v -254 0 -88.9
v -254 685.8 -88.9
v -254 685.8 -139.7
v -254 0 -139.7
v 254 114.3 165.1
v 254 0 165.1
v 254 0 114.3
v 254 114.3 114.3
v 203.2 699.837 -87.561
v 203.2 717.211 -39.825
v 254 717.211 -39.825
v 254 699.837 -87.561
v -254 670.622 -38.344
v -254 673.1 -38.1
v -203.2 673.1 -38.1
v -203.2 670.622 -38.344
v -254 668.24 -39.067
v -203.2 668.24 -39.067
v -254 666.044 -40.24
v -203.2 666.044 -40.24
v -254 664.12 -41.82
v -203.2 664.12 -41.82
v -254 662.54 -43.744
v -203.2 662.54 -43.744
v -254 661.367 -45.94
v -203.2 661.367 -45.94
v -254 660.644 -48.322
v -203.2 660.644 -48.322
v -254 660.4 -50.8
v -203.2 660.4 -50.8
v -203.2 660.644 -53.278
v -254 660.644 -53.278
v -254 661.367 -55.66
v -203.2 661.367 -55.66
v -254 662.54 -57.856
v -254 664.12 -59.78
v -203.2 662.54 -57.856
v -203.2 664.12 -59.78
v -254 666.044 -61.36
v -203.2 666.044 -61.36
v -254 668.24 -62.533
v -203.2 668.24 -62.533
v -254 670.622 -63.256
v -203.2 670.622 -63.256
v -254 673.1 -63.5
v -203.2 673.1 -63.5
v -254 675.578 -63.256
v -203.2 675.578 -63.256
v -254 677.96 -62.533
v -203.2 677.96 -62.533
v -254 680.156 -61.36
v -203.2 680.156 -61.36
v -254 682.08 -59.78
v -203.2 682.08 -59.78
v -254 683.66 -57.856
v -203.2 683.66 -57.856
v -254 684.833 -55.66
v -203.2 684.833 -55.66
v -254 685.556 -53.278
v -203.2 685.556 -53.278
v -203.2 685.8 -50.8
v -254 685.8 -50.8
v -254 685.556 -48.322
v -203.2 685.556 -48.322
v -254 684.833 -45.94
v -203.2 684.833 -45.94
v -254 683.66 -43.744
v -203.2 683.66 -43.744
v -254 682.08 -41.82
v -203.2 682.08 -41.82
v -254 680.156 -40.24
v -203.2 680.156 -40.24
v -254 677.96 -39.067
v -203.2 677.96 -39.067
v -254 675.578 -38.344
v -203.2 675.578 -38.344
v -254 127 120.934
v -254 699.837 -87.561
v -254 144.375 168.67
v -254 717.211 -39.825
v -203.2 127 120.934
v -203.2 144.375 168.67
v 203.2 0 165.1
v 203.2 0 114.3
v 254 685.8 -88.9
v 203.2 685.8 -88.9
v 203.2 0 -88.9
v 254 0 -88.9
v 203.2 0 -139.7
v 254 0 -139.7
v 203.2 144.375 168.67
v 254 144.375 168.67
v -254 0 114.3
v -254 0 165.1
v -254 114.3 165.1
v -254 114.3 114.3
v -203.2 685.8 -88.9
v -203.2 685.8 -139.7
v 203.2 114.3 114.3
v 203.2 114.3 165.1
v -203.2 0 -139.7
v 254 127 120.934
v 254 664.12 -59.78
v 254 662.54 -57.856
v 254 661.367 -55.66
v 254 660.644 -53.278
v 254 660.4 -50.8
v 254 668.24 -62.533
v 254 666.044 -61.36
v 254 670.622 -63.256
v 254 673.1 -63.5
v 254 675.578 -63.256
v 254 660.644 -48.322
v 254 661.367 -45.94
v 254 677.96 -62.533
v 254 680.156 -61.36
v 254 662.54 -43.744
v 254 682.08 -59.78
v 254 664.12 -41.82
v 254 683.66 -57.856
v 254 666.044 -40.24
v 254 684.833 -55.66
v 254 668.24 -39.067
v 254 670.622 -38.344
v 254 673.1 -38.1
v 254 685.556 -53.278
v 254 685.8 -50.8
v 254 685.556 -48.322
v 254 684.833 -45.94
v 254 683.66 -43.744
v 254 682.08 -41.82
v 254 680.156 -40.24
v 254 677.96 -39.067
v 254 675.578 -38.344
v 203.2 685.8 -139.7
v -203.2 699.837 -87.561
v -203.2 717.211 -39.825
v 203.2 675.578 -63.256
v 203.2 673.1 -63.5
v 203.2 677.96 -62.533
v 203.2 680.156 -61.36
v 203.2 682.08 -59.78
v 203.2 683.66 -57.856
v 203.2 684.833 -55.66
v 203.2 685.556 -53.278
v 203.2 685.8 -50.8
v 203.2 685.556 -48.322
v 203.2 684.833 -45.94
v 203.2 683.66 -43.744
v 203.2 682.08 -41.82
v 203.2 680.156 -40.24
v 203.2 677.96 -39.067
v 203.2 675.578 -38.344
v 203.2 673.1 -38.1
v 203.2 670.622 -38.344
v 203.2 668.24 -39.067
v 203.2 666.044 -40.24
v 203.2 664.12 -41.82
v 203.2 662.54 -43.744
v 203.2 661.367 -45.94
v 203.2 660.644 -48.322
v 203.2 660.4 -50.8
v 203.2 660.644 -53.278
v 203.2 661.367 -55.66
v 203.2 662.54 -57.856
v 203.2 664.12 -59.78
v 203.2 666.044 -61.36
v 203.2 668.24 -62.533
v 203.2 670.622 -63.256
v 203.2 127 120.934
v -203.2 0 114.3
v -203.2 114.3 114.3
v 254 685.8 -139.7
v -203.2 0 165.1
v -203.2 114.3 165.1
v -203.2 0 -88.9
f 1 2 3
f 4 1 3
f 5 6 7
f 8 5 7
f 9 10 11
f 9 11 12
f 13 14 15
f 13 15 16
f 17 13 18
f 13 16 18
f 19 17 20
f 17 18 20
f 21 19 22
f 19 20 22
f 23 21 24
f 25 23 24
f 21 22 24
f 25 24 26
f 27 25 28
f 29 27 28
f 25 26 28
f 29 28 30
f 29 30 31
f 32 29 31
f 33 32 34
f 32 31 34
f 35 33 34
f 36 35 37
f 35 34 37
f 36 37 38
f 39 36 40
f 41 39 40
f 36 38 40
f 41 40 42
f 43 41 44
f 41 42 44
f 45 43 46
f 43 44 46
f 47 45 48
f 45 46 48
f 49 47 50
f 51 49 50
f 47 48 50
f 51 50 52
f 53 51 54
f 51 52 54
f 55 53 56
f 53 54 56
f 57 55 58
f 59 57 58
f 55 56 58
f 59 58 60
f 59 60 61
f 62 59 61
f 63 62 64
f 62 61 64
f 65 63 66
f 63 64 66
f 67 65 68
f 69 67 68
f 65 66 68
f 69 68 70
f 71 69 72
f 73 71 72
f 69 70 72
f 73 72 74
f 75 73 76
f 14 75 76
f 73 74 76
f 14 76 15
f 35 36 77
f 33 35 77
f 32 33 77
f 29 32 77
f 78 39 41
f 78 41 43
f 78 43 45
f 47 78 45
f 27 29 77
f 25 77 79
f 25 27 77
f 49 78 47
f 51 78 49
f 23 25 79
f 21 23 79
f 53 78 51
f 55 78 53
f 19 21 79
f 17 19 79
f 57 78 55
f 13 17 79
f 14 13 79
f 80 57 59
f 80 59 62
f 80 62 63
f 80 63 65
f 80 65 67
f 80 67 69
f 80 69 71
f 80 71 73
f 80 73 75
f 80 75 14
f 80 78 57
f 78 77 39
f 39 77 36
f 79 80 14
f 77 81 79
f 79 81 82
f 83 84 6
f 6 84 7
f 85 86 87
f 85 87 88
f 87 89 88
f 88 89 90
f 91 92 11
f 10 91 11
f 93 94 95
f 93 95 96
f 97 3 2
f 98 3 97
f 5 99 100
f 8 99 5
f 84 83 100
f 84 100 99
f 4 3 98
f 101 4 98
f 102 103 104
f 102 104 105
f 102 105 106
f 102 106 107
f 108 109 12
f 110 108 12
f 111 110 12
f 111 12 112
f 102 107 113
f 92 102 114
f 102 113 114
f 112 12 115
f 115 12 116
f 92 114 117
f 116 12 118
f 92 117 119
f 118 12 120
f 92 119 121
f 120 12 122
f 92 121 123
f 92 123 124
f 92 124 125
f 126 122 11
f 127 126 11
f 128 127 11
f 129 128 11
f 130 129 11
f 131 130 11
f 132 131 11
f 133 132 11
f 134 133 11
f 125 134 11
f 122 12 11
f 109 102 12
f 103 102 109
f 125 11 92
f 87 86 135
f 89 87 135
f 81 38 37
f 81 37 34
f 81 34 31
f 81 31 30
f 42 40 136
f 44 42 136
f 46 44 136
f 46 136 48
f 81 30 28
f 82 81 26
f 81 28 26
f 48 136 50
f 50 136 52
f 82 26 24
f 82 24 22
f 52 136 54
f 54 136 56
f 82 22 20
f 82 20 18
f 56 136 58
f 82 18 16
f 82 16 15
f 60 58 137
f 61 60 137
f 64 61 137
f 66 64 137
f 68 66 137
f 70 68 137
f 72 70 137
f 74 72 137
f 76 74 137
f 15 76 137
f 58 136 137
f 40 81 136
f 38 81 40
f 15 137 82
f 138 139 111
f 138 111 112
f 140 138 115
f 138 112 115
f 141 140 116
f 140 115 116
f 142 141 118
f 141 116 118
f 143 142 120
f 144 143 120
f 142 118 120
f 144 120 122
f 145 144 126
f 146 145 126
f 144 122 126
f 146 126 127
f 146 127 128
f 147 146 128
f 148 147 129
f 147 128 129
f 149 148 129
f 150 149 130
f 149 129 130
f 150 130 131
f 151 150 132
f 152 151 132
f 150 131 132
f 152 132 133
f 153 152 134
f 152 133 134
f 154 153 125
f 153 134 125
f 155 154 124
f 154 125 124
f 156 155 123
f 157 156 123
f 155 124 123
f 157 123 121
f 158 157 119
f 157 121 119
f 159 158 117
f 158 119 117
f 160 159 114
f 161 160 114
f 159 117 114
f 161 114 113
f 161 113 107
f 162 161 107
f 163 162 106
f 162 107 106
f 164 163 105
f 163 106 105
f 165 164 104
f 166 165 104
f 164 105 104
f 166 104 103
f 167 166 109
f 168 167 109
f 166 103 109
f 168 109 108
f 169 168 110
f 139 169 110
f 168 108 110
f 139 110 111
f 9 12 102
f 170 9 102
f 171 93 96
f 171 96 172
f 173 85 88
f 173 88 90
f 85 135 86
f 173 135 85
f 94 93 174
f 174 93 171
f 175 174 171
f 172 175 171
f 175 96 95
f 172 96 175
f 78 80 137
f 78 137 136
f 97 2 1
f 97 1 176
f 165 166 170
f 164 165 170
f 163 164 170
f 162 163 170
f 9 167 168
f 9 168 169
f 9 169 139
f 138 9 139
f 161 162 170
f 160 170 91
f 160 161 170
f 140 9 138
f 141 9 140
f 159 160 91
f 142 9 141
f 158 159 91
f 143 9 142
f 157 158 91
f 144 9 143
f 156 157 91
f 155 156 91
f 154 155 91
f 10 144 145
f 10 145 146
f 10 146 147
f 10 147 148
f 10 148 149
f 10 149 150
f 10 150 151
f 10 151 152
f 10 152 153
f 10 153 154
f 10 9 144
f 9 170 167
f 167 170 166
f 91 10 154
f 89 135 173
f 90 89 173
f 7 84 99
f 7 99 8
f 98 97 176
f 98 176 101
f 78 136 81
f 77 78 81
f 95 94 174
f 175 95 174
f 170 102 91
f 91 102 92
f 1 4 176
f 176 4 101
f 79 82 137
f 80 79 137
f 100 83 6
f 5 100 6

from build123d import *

# Parameters (mm, degrees)
SKETCH1_W             = 50.8
SKETCH1_H             = 50.8
BOSS_EXTRUDE1_DEPTH   = 114.3
BOSS_EXTRUDE1_2_DEPTH = 114.3
BOSS_EXTRUDE1_3_DEPTH = 114.3
BOSS_EXTRUDE1_4_DEPTH = 114.3
SKETCH2_W             = 50.8
SKETCH2_H             = 50.8
BOSS_EXTRUDE2_DEPTH   = 571.5
SKETCH3_R             = 12.7
BOSS_EXTRUDE3_DEPTH   = 50.8
BOSS_EXTRUDE4_START   = -457.2
SKETCH3_3_R           = 12.7
BOSS_EXTRUDE4_DEPTH   = 50.8


with BuildPart() as part:
    # Sketch1 → Boss-Extrude1 (new body)
    with BuildSketch(Plane(origin=(0, 0, 0), x_dir=(1, 0, 0), z_dir=(0, 1, 0))):
        with Locations((228.6, 114.3)):
            Rectangle(SKETCH1_W, SKETCH1_H)
    extrude(amount=BOSS_EXTRUDE1_DEPTH)



with BuildPart() as body_2:
    # Sketch1 → Boss-Extrude1 2 (new body)
    with BuildSketch(Plane(origin=(0, 0, 0), x_dir=(1, 0, 0), z_dir=(0, 1, 0))):
        with Locations((228.6, -139.7)):
            Rectangle(SKETCH1_W, SKETCH1_H)
    extrude(amount=BOSS_EXTRUDE1_2_DEPTH)


with BuildPart() as body_3:
    # Sketch1 → Boss-Extrude1 3 (new body)
    with BuildSketch(Plane(origin=(0, 0, 0), x_dir=(1, 0, 0), z_dir=(0, 1, 0))):
        with Locations((-228.6, 114.3)):
            Rectangle(SKETCH1_W, SKETCH1_H)
    extrude(amount=BOSS_EXTRUDE1_3_DEPTH)


with BuildPart() as body_4:
    # Sketch1 → Boss-Extrude1 4 (new body)
    with BuildSketch(Plane(origin=(0, 0, 0), x_dir=(1, 0, 0), z_dir=(0, 1, 0))):
        with Locations((-228.6, -139.7)):
            Rectangle(SKETCH1_W, SKETCH1_H)
    extrude(amount=BOSS_EXTRUDE1_4_DEPTH)


with BuildPart() as part_1:
    add(part.part)

    add(body_3.part)  # Boss-Extrude2 merges body 3
    # Sketch2 → Boss-Extrude2 (add)
    with BuildSketch(Plane(origin=(0, 114.3, 0), x_dir=(1, 0, 0), z_dir=(0, 1, 0))):
        with Locations((228.6, 114.3)):
            Rectangle(SKETCH2_W, SKETCH2_H)
        with Locations((-228.6, 114.3)):
            Rectangle(SKETCH2_W, SKETCH2_H)
    extrude(amount=BOSS_EXTRUDE2_DEPTH)


with BuildPart() as body_4_2:
    # Sketch3 → Boss-Extrude3 (new body)
    with BuildSketch(Plane(origin=(254, 0, 0), x_dir=(0, 0, -1), z_dir=(1, 0, 0))):
        Polygon((39.825064724, 717.211244912), (87.561449859, 699.836621631), (-120.934029512, 127), (-168.670414648, 144.374623281), align=None)
        with Locations((50.8, 673.1)):
            Circle(SKETCH3_R, mode=Mode.SUBTRACT)
    extrude(amount=-BOSS_EXTRUDE3_DEPTH)


with BuildPart() as body_5:
    # Sketch3<3> → Boss-Extrude4 (new body)
    with BuildSketch(Plane(origin=(254, 0, 0), x_dir=(0, 0, -1), z_dir=(1, 0, 0)).offset(BOSS_EXTRUDE4_START)):
        Polygon((39.825064724, 717.211244912), (87.561449859, 699.836621631), (-120.934029512, 127), (-168.670414648, 144.374623281), align=None)
        with Locations(Location((50.8, 673.1, 0), (0, 0, 180))):
            Circle(SKETCH3_3_R, mode=Mode.SUBTRACT)
    extrude(amount=-BOSS_EXTRUDE4_DEPTH)


solid = Compound([body_2.part, body_4.part, part_1.part, body_4_2.part, body_5.part])
